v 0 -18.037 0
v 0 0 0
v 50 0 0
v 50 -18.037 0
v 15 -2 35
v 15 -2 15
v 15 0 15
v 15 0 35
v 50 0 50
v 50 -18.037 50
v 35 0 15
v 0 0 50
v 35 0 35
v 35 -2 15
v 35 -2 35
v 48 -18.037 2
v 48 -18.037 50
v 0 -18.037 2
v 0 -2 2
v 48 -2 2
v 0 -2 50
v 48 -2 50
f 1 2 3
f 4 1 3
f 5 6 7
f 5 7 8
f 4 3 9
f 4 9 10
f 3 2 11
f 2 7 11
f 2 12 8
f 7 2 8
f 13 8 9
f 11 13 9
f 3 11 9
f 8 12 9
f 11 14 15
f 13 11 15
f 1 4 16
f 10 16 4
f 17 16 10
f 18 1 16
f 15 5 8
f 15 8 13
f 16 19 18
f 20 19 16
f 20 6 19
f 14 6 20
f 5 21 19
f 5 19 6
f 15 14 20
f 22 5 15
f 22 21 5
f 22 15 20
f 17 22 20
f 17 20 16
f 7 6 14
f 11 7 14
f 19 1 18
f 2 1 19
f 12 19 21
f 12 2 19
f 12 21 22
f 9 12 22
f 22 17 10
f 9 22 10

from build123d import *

# Parameters (mm, degrees)
F0_W     = 50
F0_H     = 50
F2_DEPTH = 2
F3_W     = 20
F3_H     = 20
F4_DEPTH = 25
F5_W     = 2
F5_H     = 16.0369578302
F6_DEPTH = 50
F7_W     = 8.7346149244
F7_H     = 2
F8_DEPTH = 48
F9_DEPTH = 7.3023429058


with BuildPart() as f2:
    # F0 (on Front) → F2 (new body)
    with BuildSketch(Plane.XZ):
        with Locations((25, 25)):
            Rectangle(F0_W, F0_H)
    extrude(amount=F2_DEPTH)

    # F3 (on face) → F4 (cut)
    with BuildSketch(Plane.XZ.offset(2)):
        with Locations((25, 25)):
            Rectangle(F3_W, F3_H)
    extrude(amount=-F4_DEPTH, mode=Mode.SUBTRACT)

    # F5 (on face) → F6 (join, through all)
    with BuildSketch(Plane(origin=(0, 0, 0), x_dir=(1, 0, 0), z_dir=(0, 0, -1))):
        with Locations((49, 10.0184789151)):
            Rectangle(F5_W, F5_H)
    extrude(amount=-F6_DEPTH)

    # F7 (on face) → F8 (join, through all)
    with BuildSketch(Plane(origin=(0, 0, 0), x_dir=(0, -1, 0), z_dir=(-1, 0, 0))):
        with Locations((6.3673074622, 1)):
            Rectangle(F7_W, F7_H)
    extrude(amount=-F8_DEPTH)

    # F9 (add, through all): a face of the model
    f9_faces = [f2.faces().sort_by_distance(p)[0] for p in [
        (24, -10.7346149244, 1),
    ]]
    extrude(f9_faces, amount=F9_DEPTH)


solid = f2.part
